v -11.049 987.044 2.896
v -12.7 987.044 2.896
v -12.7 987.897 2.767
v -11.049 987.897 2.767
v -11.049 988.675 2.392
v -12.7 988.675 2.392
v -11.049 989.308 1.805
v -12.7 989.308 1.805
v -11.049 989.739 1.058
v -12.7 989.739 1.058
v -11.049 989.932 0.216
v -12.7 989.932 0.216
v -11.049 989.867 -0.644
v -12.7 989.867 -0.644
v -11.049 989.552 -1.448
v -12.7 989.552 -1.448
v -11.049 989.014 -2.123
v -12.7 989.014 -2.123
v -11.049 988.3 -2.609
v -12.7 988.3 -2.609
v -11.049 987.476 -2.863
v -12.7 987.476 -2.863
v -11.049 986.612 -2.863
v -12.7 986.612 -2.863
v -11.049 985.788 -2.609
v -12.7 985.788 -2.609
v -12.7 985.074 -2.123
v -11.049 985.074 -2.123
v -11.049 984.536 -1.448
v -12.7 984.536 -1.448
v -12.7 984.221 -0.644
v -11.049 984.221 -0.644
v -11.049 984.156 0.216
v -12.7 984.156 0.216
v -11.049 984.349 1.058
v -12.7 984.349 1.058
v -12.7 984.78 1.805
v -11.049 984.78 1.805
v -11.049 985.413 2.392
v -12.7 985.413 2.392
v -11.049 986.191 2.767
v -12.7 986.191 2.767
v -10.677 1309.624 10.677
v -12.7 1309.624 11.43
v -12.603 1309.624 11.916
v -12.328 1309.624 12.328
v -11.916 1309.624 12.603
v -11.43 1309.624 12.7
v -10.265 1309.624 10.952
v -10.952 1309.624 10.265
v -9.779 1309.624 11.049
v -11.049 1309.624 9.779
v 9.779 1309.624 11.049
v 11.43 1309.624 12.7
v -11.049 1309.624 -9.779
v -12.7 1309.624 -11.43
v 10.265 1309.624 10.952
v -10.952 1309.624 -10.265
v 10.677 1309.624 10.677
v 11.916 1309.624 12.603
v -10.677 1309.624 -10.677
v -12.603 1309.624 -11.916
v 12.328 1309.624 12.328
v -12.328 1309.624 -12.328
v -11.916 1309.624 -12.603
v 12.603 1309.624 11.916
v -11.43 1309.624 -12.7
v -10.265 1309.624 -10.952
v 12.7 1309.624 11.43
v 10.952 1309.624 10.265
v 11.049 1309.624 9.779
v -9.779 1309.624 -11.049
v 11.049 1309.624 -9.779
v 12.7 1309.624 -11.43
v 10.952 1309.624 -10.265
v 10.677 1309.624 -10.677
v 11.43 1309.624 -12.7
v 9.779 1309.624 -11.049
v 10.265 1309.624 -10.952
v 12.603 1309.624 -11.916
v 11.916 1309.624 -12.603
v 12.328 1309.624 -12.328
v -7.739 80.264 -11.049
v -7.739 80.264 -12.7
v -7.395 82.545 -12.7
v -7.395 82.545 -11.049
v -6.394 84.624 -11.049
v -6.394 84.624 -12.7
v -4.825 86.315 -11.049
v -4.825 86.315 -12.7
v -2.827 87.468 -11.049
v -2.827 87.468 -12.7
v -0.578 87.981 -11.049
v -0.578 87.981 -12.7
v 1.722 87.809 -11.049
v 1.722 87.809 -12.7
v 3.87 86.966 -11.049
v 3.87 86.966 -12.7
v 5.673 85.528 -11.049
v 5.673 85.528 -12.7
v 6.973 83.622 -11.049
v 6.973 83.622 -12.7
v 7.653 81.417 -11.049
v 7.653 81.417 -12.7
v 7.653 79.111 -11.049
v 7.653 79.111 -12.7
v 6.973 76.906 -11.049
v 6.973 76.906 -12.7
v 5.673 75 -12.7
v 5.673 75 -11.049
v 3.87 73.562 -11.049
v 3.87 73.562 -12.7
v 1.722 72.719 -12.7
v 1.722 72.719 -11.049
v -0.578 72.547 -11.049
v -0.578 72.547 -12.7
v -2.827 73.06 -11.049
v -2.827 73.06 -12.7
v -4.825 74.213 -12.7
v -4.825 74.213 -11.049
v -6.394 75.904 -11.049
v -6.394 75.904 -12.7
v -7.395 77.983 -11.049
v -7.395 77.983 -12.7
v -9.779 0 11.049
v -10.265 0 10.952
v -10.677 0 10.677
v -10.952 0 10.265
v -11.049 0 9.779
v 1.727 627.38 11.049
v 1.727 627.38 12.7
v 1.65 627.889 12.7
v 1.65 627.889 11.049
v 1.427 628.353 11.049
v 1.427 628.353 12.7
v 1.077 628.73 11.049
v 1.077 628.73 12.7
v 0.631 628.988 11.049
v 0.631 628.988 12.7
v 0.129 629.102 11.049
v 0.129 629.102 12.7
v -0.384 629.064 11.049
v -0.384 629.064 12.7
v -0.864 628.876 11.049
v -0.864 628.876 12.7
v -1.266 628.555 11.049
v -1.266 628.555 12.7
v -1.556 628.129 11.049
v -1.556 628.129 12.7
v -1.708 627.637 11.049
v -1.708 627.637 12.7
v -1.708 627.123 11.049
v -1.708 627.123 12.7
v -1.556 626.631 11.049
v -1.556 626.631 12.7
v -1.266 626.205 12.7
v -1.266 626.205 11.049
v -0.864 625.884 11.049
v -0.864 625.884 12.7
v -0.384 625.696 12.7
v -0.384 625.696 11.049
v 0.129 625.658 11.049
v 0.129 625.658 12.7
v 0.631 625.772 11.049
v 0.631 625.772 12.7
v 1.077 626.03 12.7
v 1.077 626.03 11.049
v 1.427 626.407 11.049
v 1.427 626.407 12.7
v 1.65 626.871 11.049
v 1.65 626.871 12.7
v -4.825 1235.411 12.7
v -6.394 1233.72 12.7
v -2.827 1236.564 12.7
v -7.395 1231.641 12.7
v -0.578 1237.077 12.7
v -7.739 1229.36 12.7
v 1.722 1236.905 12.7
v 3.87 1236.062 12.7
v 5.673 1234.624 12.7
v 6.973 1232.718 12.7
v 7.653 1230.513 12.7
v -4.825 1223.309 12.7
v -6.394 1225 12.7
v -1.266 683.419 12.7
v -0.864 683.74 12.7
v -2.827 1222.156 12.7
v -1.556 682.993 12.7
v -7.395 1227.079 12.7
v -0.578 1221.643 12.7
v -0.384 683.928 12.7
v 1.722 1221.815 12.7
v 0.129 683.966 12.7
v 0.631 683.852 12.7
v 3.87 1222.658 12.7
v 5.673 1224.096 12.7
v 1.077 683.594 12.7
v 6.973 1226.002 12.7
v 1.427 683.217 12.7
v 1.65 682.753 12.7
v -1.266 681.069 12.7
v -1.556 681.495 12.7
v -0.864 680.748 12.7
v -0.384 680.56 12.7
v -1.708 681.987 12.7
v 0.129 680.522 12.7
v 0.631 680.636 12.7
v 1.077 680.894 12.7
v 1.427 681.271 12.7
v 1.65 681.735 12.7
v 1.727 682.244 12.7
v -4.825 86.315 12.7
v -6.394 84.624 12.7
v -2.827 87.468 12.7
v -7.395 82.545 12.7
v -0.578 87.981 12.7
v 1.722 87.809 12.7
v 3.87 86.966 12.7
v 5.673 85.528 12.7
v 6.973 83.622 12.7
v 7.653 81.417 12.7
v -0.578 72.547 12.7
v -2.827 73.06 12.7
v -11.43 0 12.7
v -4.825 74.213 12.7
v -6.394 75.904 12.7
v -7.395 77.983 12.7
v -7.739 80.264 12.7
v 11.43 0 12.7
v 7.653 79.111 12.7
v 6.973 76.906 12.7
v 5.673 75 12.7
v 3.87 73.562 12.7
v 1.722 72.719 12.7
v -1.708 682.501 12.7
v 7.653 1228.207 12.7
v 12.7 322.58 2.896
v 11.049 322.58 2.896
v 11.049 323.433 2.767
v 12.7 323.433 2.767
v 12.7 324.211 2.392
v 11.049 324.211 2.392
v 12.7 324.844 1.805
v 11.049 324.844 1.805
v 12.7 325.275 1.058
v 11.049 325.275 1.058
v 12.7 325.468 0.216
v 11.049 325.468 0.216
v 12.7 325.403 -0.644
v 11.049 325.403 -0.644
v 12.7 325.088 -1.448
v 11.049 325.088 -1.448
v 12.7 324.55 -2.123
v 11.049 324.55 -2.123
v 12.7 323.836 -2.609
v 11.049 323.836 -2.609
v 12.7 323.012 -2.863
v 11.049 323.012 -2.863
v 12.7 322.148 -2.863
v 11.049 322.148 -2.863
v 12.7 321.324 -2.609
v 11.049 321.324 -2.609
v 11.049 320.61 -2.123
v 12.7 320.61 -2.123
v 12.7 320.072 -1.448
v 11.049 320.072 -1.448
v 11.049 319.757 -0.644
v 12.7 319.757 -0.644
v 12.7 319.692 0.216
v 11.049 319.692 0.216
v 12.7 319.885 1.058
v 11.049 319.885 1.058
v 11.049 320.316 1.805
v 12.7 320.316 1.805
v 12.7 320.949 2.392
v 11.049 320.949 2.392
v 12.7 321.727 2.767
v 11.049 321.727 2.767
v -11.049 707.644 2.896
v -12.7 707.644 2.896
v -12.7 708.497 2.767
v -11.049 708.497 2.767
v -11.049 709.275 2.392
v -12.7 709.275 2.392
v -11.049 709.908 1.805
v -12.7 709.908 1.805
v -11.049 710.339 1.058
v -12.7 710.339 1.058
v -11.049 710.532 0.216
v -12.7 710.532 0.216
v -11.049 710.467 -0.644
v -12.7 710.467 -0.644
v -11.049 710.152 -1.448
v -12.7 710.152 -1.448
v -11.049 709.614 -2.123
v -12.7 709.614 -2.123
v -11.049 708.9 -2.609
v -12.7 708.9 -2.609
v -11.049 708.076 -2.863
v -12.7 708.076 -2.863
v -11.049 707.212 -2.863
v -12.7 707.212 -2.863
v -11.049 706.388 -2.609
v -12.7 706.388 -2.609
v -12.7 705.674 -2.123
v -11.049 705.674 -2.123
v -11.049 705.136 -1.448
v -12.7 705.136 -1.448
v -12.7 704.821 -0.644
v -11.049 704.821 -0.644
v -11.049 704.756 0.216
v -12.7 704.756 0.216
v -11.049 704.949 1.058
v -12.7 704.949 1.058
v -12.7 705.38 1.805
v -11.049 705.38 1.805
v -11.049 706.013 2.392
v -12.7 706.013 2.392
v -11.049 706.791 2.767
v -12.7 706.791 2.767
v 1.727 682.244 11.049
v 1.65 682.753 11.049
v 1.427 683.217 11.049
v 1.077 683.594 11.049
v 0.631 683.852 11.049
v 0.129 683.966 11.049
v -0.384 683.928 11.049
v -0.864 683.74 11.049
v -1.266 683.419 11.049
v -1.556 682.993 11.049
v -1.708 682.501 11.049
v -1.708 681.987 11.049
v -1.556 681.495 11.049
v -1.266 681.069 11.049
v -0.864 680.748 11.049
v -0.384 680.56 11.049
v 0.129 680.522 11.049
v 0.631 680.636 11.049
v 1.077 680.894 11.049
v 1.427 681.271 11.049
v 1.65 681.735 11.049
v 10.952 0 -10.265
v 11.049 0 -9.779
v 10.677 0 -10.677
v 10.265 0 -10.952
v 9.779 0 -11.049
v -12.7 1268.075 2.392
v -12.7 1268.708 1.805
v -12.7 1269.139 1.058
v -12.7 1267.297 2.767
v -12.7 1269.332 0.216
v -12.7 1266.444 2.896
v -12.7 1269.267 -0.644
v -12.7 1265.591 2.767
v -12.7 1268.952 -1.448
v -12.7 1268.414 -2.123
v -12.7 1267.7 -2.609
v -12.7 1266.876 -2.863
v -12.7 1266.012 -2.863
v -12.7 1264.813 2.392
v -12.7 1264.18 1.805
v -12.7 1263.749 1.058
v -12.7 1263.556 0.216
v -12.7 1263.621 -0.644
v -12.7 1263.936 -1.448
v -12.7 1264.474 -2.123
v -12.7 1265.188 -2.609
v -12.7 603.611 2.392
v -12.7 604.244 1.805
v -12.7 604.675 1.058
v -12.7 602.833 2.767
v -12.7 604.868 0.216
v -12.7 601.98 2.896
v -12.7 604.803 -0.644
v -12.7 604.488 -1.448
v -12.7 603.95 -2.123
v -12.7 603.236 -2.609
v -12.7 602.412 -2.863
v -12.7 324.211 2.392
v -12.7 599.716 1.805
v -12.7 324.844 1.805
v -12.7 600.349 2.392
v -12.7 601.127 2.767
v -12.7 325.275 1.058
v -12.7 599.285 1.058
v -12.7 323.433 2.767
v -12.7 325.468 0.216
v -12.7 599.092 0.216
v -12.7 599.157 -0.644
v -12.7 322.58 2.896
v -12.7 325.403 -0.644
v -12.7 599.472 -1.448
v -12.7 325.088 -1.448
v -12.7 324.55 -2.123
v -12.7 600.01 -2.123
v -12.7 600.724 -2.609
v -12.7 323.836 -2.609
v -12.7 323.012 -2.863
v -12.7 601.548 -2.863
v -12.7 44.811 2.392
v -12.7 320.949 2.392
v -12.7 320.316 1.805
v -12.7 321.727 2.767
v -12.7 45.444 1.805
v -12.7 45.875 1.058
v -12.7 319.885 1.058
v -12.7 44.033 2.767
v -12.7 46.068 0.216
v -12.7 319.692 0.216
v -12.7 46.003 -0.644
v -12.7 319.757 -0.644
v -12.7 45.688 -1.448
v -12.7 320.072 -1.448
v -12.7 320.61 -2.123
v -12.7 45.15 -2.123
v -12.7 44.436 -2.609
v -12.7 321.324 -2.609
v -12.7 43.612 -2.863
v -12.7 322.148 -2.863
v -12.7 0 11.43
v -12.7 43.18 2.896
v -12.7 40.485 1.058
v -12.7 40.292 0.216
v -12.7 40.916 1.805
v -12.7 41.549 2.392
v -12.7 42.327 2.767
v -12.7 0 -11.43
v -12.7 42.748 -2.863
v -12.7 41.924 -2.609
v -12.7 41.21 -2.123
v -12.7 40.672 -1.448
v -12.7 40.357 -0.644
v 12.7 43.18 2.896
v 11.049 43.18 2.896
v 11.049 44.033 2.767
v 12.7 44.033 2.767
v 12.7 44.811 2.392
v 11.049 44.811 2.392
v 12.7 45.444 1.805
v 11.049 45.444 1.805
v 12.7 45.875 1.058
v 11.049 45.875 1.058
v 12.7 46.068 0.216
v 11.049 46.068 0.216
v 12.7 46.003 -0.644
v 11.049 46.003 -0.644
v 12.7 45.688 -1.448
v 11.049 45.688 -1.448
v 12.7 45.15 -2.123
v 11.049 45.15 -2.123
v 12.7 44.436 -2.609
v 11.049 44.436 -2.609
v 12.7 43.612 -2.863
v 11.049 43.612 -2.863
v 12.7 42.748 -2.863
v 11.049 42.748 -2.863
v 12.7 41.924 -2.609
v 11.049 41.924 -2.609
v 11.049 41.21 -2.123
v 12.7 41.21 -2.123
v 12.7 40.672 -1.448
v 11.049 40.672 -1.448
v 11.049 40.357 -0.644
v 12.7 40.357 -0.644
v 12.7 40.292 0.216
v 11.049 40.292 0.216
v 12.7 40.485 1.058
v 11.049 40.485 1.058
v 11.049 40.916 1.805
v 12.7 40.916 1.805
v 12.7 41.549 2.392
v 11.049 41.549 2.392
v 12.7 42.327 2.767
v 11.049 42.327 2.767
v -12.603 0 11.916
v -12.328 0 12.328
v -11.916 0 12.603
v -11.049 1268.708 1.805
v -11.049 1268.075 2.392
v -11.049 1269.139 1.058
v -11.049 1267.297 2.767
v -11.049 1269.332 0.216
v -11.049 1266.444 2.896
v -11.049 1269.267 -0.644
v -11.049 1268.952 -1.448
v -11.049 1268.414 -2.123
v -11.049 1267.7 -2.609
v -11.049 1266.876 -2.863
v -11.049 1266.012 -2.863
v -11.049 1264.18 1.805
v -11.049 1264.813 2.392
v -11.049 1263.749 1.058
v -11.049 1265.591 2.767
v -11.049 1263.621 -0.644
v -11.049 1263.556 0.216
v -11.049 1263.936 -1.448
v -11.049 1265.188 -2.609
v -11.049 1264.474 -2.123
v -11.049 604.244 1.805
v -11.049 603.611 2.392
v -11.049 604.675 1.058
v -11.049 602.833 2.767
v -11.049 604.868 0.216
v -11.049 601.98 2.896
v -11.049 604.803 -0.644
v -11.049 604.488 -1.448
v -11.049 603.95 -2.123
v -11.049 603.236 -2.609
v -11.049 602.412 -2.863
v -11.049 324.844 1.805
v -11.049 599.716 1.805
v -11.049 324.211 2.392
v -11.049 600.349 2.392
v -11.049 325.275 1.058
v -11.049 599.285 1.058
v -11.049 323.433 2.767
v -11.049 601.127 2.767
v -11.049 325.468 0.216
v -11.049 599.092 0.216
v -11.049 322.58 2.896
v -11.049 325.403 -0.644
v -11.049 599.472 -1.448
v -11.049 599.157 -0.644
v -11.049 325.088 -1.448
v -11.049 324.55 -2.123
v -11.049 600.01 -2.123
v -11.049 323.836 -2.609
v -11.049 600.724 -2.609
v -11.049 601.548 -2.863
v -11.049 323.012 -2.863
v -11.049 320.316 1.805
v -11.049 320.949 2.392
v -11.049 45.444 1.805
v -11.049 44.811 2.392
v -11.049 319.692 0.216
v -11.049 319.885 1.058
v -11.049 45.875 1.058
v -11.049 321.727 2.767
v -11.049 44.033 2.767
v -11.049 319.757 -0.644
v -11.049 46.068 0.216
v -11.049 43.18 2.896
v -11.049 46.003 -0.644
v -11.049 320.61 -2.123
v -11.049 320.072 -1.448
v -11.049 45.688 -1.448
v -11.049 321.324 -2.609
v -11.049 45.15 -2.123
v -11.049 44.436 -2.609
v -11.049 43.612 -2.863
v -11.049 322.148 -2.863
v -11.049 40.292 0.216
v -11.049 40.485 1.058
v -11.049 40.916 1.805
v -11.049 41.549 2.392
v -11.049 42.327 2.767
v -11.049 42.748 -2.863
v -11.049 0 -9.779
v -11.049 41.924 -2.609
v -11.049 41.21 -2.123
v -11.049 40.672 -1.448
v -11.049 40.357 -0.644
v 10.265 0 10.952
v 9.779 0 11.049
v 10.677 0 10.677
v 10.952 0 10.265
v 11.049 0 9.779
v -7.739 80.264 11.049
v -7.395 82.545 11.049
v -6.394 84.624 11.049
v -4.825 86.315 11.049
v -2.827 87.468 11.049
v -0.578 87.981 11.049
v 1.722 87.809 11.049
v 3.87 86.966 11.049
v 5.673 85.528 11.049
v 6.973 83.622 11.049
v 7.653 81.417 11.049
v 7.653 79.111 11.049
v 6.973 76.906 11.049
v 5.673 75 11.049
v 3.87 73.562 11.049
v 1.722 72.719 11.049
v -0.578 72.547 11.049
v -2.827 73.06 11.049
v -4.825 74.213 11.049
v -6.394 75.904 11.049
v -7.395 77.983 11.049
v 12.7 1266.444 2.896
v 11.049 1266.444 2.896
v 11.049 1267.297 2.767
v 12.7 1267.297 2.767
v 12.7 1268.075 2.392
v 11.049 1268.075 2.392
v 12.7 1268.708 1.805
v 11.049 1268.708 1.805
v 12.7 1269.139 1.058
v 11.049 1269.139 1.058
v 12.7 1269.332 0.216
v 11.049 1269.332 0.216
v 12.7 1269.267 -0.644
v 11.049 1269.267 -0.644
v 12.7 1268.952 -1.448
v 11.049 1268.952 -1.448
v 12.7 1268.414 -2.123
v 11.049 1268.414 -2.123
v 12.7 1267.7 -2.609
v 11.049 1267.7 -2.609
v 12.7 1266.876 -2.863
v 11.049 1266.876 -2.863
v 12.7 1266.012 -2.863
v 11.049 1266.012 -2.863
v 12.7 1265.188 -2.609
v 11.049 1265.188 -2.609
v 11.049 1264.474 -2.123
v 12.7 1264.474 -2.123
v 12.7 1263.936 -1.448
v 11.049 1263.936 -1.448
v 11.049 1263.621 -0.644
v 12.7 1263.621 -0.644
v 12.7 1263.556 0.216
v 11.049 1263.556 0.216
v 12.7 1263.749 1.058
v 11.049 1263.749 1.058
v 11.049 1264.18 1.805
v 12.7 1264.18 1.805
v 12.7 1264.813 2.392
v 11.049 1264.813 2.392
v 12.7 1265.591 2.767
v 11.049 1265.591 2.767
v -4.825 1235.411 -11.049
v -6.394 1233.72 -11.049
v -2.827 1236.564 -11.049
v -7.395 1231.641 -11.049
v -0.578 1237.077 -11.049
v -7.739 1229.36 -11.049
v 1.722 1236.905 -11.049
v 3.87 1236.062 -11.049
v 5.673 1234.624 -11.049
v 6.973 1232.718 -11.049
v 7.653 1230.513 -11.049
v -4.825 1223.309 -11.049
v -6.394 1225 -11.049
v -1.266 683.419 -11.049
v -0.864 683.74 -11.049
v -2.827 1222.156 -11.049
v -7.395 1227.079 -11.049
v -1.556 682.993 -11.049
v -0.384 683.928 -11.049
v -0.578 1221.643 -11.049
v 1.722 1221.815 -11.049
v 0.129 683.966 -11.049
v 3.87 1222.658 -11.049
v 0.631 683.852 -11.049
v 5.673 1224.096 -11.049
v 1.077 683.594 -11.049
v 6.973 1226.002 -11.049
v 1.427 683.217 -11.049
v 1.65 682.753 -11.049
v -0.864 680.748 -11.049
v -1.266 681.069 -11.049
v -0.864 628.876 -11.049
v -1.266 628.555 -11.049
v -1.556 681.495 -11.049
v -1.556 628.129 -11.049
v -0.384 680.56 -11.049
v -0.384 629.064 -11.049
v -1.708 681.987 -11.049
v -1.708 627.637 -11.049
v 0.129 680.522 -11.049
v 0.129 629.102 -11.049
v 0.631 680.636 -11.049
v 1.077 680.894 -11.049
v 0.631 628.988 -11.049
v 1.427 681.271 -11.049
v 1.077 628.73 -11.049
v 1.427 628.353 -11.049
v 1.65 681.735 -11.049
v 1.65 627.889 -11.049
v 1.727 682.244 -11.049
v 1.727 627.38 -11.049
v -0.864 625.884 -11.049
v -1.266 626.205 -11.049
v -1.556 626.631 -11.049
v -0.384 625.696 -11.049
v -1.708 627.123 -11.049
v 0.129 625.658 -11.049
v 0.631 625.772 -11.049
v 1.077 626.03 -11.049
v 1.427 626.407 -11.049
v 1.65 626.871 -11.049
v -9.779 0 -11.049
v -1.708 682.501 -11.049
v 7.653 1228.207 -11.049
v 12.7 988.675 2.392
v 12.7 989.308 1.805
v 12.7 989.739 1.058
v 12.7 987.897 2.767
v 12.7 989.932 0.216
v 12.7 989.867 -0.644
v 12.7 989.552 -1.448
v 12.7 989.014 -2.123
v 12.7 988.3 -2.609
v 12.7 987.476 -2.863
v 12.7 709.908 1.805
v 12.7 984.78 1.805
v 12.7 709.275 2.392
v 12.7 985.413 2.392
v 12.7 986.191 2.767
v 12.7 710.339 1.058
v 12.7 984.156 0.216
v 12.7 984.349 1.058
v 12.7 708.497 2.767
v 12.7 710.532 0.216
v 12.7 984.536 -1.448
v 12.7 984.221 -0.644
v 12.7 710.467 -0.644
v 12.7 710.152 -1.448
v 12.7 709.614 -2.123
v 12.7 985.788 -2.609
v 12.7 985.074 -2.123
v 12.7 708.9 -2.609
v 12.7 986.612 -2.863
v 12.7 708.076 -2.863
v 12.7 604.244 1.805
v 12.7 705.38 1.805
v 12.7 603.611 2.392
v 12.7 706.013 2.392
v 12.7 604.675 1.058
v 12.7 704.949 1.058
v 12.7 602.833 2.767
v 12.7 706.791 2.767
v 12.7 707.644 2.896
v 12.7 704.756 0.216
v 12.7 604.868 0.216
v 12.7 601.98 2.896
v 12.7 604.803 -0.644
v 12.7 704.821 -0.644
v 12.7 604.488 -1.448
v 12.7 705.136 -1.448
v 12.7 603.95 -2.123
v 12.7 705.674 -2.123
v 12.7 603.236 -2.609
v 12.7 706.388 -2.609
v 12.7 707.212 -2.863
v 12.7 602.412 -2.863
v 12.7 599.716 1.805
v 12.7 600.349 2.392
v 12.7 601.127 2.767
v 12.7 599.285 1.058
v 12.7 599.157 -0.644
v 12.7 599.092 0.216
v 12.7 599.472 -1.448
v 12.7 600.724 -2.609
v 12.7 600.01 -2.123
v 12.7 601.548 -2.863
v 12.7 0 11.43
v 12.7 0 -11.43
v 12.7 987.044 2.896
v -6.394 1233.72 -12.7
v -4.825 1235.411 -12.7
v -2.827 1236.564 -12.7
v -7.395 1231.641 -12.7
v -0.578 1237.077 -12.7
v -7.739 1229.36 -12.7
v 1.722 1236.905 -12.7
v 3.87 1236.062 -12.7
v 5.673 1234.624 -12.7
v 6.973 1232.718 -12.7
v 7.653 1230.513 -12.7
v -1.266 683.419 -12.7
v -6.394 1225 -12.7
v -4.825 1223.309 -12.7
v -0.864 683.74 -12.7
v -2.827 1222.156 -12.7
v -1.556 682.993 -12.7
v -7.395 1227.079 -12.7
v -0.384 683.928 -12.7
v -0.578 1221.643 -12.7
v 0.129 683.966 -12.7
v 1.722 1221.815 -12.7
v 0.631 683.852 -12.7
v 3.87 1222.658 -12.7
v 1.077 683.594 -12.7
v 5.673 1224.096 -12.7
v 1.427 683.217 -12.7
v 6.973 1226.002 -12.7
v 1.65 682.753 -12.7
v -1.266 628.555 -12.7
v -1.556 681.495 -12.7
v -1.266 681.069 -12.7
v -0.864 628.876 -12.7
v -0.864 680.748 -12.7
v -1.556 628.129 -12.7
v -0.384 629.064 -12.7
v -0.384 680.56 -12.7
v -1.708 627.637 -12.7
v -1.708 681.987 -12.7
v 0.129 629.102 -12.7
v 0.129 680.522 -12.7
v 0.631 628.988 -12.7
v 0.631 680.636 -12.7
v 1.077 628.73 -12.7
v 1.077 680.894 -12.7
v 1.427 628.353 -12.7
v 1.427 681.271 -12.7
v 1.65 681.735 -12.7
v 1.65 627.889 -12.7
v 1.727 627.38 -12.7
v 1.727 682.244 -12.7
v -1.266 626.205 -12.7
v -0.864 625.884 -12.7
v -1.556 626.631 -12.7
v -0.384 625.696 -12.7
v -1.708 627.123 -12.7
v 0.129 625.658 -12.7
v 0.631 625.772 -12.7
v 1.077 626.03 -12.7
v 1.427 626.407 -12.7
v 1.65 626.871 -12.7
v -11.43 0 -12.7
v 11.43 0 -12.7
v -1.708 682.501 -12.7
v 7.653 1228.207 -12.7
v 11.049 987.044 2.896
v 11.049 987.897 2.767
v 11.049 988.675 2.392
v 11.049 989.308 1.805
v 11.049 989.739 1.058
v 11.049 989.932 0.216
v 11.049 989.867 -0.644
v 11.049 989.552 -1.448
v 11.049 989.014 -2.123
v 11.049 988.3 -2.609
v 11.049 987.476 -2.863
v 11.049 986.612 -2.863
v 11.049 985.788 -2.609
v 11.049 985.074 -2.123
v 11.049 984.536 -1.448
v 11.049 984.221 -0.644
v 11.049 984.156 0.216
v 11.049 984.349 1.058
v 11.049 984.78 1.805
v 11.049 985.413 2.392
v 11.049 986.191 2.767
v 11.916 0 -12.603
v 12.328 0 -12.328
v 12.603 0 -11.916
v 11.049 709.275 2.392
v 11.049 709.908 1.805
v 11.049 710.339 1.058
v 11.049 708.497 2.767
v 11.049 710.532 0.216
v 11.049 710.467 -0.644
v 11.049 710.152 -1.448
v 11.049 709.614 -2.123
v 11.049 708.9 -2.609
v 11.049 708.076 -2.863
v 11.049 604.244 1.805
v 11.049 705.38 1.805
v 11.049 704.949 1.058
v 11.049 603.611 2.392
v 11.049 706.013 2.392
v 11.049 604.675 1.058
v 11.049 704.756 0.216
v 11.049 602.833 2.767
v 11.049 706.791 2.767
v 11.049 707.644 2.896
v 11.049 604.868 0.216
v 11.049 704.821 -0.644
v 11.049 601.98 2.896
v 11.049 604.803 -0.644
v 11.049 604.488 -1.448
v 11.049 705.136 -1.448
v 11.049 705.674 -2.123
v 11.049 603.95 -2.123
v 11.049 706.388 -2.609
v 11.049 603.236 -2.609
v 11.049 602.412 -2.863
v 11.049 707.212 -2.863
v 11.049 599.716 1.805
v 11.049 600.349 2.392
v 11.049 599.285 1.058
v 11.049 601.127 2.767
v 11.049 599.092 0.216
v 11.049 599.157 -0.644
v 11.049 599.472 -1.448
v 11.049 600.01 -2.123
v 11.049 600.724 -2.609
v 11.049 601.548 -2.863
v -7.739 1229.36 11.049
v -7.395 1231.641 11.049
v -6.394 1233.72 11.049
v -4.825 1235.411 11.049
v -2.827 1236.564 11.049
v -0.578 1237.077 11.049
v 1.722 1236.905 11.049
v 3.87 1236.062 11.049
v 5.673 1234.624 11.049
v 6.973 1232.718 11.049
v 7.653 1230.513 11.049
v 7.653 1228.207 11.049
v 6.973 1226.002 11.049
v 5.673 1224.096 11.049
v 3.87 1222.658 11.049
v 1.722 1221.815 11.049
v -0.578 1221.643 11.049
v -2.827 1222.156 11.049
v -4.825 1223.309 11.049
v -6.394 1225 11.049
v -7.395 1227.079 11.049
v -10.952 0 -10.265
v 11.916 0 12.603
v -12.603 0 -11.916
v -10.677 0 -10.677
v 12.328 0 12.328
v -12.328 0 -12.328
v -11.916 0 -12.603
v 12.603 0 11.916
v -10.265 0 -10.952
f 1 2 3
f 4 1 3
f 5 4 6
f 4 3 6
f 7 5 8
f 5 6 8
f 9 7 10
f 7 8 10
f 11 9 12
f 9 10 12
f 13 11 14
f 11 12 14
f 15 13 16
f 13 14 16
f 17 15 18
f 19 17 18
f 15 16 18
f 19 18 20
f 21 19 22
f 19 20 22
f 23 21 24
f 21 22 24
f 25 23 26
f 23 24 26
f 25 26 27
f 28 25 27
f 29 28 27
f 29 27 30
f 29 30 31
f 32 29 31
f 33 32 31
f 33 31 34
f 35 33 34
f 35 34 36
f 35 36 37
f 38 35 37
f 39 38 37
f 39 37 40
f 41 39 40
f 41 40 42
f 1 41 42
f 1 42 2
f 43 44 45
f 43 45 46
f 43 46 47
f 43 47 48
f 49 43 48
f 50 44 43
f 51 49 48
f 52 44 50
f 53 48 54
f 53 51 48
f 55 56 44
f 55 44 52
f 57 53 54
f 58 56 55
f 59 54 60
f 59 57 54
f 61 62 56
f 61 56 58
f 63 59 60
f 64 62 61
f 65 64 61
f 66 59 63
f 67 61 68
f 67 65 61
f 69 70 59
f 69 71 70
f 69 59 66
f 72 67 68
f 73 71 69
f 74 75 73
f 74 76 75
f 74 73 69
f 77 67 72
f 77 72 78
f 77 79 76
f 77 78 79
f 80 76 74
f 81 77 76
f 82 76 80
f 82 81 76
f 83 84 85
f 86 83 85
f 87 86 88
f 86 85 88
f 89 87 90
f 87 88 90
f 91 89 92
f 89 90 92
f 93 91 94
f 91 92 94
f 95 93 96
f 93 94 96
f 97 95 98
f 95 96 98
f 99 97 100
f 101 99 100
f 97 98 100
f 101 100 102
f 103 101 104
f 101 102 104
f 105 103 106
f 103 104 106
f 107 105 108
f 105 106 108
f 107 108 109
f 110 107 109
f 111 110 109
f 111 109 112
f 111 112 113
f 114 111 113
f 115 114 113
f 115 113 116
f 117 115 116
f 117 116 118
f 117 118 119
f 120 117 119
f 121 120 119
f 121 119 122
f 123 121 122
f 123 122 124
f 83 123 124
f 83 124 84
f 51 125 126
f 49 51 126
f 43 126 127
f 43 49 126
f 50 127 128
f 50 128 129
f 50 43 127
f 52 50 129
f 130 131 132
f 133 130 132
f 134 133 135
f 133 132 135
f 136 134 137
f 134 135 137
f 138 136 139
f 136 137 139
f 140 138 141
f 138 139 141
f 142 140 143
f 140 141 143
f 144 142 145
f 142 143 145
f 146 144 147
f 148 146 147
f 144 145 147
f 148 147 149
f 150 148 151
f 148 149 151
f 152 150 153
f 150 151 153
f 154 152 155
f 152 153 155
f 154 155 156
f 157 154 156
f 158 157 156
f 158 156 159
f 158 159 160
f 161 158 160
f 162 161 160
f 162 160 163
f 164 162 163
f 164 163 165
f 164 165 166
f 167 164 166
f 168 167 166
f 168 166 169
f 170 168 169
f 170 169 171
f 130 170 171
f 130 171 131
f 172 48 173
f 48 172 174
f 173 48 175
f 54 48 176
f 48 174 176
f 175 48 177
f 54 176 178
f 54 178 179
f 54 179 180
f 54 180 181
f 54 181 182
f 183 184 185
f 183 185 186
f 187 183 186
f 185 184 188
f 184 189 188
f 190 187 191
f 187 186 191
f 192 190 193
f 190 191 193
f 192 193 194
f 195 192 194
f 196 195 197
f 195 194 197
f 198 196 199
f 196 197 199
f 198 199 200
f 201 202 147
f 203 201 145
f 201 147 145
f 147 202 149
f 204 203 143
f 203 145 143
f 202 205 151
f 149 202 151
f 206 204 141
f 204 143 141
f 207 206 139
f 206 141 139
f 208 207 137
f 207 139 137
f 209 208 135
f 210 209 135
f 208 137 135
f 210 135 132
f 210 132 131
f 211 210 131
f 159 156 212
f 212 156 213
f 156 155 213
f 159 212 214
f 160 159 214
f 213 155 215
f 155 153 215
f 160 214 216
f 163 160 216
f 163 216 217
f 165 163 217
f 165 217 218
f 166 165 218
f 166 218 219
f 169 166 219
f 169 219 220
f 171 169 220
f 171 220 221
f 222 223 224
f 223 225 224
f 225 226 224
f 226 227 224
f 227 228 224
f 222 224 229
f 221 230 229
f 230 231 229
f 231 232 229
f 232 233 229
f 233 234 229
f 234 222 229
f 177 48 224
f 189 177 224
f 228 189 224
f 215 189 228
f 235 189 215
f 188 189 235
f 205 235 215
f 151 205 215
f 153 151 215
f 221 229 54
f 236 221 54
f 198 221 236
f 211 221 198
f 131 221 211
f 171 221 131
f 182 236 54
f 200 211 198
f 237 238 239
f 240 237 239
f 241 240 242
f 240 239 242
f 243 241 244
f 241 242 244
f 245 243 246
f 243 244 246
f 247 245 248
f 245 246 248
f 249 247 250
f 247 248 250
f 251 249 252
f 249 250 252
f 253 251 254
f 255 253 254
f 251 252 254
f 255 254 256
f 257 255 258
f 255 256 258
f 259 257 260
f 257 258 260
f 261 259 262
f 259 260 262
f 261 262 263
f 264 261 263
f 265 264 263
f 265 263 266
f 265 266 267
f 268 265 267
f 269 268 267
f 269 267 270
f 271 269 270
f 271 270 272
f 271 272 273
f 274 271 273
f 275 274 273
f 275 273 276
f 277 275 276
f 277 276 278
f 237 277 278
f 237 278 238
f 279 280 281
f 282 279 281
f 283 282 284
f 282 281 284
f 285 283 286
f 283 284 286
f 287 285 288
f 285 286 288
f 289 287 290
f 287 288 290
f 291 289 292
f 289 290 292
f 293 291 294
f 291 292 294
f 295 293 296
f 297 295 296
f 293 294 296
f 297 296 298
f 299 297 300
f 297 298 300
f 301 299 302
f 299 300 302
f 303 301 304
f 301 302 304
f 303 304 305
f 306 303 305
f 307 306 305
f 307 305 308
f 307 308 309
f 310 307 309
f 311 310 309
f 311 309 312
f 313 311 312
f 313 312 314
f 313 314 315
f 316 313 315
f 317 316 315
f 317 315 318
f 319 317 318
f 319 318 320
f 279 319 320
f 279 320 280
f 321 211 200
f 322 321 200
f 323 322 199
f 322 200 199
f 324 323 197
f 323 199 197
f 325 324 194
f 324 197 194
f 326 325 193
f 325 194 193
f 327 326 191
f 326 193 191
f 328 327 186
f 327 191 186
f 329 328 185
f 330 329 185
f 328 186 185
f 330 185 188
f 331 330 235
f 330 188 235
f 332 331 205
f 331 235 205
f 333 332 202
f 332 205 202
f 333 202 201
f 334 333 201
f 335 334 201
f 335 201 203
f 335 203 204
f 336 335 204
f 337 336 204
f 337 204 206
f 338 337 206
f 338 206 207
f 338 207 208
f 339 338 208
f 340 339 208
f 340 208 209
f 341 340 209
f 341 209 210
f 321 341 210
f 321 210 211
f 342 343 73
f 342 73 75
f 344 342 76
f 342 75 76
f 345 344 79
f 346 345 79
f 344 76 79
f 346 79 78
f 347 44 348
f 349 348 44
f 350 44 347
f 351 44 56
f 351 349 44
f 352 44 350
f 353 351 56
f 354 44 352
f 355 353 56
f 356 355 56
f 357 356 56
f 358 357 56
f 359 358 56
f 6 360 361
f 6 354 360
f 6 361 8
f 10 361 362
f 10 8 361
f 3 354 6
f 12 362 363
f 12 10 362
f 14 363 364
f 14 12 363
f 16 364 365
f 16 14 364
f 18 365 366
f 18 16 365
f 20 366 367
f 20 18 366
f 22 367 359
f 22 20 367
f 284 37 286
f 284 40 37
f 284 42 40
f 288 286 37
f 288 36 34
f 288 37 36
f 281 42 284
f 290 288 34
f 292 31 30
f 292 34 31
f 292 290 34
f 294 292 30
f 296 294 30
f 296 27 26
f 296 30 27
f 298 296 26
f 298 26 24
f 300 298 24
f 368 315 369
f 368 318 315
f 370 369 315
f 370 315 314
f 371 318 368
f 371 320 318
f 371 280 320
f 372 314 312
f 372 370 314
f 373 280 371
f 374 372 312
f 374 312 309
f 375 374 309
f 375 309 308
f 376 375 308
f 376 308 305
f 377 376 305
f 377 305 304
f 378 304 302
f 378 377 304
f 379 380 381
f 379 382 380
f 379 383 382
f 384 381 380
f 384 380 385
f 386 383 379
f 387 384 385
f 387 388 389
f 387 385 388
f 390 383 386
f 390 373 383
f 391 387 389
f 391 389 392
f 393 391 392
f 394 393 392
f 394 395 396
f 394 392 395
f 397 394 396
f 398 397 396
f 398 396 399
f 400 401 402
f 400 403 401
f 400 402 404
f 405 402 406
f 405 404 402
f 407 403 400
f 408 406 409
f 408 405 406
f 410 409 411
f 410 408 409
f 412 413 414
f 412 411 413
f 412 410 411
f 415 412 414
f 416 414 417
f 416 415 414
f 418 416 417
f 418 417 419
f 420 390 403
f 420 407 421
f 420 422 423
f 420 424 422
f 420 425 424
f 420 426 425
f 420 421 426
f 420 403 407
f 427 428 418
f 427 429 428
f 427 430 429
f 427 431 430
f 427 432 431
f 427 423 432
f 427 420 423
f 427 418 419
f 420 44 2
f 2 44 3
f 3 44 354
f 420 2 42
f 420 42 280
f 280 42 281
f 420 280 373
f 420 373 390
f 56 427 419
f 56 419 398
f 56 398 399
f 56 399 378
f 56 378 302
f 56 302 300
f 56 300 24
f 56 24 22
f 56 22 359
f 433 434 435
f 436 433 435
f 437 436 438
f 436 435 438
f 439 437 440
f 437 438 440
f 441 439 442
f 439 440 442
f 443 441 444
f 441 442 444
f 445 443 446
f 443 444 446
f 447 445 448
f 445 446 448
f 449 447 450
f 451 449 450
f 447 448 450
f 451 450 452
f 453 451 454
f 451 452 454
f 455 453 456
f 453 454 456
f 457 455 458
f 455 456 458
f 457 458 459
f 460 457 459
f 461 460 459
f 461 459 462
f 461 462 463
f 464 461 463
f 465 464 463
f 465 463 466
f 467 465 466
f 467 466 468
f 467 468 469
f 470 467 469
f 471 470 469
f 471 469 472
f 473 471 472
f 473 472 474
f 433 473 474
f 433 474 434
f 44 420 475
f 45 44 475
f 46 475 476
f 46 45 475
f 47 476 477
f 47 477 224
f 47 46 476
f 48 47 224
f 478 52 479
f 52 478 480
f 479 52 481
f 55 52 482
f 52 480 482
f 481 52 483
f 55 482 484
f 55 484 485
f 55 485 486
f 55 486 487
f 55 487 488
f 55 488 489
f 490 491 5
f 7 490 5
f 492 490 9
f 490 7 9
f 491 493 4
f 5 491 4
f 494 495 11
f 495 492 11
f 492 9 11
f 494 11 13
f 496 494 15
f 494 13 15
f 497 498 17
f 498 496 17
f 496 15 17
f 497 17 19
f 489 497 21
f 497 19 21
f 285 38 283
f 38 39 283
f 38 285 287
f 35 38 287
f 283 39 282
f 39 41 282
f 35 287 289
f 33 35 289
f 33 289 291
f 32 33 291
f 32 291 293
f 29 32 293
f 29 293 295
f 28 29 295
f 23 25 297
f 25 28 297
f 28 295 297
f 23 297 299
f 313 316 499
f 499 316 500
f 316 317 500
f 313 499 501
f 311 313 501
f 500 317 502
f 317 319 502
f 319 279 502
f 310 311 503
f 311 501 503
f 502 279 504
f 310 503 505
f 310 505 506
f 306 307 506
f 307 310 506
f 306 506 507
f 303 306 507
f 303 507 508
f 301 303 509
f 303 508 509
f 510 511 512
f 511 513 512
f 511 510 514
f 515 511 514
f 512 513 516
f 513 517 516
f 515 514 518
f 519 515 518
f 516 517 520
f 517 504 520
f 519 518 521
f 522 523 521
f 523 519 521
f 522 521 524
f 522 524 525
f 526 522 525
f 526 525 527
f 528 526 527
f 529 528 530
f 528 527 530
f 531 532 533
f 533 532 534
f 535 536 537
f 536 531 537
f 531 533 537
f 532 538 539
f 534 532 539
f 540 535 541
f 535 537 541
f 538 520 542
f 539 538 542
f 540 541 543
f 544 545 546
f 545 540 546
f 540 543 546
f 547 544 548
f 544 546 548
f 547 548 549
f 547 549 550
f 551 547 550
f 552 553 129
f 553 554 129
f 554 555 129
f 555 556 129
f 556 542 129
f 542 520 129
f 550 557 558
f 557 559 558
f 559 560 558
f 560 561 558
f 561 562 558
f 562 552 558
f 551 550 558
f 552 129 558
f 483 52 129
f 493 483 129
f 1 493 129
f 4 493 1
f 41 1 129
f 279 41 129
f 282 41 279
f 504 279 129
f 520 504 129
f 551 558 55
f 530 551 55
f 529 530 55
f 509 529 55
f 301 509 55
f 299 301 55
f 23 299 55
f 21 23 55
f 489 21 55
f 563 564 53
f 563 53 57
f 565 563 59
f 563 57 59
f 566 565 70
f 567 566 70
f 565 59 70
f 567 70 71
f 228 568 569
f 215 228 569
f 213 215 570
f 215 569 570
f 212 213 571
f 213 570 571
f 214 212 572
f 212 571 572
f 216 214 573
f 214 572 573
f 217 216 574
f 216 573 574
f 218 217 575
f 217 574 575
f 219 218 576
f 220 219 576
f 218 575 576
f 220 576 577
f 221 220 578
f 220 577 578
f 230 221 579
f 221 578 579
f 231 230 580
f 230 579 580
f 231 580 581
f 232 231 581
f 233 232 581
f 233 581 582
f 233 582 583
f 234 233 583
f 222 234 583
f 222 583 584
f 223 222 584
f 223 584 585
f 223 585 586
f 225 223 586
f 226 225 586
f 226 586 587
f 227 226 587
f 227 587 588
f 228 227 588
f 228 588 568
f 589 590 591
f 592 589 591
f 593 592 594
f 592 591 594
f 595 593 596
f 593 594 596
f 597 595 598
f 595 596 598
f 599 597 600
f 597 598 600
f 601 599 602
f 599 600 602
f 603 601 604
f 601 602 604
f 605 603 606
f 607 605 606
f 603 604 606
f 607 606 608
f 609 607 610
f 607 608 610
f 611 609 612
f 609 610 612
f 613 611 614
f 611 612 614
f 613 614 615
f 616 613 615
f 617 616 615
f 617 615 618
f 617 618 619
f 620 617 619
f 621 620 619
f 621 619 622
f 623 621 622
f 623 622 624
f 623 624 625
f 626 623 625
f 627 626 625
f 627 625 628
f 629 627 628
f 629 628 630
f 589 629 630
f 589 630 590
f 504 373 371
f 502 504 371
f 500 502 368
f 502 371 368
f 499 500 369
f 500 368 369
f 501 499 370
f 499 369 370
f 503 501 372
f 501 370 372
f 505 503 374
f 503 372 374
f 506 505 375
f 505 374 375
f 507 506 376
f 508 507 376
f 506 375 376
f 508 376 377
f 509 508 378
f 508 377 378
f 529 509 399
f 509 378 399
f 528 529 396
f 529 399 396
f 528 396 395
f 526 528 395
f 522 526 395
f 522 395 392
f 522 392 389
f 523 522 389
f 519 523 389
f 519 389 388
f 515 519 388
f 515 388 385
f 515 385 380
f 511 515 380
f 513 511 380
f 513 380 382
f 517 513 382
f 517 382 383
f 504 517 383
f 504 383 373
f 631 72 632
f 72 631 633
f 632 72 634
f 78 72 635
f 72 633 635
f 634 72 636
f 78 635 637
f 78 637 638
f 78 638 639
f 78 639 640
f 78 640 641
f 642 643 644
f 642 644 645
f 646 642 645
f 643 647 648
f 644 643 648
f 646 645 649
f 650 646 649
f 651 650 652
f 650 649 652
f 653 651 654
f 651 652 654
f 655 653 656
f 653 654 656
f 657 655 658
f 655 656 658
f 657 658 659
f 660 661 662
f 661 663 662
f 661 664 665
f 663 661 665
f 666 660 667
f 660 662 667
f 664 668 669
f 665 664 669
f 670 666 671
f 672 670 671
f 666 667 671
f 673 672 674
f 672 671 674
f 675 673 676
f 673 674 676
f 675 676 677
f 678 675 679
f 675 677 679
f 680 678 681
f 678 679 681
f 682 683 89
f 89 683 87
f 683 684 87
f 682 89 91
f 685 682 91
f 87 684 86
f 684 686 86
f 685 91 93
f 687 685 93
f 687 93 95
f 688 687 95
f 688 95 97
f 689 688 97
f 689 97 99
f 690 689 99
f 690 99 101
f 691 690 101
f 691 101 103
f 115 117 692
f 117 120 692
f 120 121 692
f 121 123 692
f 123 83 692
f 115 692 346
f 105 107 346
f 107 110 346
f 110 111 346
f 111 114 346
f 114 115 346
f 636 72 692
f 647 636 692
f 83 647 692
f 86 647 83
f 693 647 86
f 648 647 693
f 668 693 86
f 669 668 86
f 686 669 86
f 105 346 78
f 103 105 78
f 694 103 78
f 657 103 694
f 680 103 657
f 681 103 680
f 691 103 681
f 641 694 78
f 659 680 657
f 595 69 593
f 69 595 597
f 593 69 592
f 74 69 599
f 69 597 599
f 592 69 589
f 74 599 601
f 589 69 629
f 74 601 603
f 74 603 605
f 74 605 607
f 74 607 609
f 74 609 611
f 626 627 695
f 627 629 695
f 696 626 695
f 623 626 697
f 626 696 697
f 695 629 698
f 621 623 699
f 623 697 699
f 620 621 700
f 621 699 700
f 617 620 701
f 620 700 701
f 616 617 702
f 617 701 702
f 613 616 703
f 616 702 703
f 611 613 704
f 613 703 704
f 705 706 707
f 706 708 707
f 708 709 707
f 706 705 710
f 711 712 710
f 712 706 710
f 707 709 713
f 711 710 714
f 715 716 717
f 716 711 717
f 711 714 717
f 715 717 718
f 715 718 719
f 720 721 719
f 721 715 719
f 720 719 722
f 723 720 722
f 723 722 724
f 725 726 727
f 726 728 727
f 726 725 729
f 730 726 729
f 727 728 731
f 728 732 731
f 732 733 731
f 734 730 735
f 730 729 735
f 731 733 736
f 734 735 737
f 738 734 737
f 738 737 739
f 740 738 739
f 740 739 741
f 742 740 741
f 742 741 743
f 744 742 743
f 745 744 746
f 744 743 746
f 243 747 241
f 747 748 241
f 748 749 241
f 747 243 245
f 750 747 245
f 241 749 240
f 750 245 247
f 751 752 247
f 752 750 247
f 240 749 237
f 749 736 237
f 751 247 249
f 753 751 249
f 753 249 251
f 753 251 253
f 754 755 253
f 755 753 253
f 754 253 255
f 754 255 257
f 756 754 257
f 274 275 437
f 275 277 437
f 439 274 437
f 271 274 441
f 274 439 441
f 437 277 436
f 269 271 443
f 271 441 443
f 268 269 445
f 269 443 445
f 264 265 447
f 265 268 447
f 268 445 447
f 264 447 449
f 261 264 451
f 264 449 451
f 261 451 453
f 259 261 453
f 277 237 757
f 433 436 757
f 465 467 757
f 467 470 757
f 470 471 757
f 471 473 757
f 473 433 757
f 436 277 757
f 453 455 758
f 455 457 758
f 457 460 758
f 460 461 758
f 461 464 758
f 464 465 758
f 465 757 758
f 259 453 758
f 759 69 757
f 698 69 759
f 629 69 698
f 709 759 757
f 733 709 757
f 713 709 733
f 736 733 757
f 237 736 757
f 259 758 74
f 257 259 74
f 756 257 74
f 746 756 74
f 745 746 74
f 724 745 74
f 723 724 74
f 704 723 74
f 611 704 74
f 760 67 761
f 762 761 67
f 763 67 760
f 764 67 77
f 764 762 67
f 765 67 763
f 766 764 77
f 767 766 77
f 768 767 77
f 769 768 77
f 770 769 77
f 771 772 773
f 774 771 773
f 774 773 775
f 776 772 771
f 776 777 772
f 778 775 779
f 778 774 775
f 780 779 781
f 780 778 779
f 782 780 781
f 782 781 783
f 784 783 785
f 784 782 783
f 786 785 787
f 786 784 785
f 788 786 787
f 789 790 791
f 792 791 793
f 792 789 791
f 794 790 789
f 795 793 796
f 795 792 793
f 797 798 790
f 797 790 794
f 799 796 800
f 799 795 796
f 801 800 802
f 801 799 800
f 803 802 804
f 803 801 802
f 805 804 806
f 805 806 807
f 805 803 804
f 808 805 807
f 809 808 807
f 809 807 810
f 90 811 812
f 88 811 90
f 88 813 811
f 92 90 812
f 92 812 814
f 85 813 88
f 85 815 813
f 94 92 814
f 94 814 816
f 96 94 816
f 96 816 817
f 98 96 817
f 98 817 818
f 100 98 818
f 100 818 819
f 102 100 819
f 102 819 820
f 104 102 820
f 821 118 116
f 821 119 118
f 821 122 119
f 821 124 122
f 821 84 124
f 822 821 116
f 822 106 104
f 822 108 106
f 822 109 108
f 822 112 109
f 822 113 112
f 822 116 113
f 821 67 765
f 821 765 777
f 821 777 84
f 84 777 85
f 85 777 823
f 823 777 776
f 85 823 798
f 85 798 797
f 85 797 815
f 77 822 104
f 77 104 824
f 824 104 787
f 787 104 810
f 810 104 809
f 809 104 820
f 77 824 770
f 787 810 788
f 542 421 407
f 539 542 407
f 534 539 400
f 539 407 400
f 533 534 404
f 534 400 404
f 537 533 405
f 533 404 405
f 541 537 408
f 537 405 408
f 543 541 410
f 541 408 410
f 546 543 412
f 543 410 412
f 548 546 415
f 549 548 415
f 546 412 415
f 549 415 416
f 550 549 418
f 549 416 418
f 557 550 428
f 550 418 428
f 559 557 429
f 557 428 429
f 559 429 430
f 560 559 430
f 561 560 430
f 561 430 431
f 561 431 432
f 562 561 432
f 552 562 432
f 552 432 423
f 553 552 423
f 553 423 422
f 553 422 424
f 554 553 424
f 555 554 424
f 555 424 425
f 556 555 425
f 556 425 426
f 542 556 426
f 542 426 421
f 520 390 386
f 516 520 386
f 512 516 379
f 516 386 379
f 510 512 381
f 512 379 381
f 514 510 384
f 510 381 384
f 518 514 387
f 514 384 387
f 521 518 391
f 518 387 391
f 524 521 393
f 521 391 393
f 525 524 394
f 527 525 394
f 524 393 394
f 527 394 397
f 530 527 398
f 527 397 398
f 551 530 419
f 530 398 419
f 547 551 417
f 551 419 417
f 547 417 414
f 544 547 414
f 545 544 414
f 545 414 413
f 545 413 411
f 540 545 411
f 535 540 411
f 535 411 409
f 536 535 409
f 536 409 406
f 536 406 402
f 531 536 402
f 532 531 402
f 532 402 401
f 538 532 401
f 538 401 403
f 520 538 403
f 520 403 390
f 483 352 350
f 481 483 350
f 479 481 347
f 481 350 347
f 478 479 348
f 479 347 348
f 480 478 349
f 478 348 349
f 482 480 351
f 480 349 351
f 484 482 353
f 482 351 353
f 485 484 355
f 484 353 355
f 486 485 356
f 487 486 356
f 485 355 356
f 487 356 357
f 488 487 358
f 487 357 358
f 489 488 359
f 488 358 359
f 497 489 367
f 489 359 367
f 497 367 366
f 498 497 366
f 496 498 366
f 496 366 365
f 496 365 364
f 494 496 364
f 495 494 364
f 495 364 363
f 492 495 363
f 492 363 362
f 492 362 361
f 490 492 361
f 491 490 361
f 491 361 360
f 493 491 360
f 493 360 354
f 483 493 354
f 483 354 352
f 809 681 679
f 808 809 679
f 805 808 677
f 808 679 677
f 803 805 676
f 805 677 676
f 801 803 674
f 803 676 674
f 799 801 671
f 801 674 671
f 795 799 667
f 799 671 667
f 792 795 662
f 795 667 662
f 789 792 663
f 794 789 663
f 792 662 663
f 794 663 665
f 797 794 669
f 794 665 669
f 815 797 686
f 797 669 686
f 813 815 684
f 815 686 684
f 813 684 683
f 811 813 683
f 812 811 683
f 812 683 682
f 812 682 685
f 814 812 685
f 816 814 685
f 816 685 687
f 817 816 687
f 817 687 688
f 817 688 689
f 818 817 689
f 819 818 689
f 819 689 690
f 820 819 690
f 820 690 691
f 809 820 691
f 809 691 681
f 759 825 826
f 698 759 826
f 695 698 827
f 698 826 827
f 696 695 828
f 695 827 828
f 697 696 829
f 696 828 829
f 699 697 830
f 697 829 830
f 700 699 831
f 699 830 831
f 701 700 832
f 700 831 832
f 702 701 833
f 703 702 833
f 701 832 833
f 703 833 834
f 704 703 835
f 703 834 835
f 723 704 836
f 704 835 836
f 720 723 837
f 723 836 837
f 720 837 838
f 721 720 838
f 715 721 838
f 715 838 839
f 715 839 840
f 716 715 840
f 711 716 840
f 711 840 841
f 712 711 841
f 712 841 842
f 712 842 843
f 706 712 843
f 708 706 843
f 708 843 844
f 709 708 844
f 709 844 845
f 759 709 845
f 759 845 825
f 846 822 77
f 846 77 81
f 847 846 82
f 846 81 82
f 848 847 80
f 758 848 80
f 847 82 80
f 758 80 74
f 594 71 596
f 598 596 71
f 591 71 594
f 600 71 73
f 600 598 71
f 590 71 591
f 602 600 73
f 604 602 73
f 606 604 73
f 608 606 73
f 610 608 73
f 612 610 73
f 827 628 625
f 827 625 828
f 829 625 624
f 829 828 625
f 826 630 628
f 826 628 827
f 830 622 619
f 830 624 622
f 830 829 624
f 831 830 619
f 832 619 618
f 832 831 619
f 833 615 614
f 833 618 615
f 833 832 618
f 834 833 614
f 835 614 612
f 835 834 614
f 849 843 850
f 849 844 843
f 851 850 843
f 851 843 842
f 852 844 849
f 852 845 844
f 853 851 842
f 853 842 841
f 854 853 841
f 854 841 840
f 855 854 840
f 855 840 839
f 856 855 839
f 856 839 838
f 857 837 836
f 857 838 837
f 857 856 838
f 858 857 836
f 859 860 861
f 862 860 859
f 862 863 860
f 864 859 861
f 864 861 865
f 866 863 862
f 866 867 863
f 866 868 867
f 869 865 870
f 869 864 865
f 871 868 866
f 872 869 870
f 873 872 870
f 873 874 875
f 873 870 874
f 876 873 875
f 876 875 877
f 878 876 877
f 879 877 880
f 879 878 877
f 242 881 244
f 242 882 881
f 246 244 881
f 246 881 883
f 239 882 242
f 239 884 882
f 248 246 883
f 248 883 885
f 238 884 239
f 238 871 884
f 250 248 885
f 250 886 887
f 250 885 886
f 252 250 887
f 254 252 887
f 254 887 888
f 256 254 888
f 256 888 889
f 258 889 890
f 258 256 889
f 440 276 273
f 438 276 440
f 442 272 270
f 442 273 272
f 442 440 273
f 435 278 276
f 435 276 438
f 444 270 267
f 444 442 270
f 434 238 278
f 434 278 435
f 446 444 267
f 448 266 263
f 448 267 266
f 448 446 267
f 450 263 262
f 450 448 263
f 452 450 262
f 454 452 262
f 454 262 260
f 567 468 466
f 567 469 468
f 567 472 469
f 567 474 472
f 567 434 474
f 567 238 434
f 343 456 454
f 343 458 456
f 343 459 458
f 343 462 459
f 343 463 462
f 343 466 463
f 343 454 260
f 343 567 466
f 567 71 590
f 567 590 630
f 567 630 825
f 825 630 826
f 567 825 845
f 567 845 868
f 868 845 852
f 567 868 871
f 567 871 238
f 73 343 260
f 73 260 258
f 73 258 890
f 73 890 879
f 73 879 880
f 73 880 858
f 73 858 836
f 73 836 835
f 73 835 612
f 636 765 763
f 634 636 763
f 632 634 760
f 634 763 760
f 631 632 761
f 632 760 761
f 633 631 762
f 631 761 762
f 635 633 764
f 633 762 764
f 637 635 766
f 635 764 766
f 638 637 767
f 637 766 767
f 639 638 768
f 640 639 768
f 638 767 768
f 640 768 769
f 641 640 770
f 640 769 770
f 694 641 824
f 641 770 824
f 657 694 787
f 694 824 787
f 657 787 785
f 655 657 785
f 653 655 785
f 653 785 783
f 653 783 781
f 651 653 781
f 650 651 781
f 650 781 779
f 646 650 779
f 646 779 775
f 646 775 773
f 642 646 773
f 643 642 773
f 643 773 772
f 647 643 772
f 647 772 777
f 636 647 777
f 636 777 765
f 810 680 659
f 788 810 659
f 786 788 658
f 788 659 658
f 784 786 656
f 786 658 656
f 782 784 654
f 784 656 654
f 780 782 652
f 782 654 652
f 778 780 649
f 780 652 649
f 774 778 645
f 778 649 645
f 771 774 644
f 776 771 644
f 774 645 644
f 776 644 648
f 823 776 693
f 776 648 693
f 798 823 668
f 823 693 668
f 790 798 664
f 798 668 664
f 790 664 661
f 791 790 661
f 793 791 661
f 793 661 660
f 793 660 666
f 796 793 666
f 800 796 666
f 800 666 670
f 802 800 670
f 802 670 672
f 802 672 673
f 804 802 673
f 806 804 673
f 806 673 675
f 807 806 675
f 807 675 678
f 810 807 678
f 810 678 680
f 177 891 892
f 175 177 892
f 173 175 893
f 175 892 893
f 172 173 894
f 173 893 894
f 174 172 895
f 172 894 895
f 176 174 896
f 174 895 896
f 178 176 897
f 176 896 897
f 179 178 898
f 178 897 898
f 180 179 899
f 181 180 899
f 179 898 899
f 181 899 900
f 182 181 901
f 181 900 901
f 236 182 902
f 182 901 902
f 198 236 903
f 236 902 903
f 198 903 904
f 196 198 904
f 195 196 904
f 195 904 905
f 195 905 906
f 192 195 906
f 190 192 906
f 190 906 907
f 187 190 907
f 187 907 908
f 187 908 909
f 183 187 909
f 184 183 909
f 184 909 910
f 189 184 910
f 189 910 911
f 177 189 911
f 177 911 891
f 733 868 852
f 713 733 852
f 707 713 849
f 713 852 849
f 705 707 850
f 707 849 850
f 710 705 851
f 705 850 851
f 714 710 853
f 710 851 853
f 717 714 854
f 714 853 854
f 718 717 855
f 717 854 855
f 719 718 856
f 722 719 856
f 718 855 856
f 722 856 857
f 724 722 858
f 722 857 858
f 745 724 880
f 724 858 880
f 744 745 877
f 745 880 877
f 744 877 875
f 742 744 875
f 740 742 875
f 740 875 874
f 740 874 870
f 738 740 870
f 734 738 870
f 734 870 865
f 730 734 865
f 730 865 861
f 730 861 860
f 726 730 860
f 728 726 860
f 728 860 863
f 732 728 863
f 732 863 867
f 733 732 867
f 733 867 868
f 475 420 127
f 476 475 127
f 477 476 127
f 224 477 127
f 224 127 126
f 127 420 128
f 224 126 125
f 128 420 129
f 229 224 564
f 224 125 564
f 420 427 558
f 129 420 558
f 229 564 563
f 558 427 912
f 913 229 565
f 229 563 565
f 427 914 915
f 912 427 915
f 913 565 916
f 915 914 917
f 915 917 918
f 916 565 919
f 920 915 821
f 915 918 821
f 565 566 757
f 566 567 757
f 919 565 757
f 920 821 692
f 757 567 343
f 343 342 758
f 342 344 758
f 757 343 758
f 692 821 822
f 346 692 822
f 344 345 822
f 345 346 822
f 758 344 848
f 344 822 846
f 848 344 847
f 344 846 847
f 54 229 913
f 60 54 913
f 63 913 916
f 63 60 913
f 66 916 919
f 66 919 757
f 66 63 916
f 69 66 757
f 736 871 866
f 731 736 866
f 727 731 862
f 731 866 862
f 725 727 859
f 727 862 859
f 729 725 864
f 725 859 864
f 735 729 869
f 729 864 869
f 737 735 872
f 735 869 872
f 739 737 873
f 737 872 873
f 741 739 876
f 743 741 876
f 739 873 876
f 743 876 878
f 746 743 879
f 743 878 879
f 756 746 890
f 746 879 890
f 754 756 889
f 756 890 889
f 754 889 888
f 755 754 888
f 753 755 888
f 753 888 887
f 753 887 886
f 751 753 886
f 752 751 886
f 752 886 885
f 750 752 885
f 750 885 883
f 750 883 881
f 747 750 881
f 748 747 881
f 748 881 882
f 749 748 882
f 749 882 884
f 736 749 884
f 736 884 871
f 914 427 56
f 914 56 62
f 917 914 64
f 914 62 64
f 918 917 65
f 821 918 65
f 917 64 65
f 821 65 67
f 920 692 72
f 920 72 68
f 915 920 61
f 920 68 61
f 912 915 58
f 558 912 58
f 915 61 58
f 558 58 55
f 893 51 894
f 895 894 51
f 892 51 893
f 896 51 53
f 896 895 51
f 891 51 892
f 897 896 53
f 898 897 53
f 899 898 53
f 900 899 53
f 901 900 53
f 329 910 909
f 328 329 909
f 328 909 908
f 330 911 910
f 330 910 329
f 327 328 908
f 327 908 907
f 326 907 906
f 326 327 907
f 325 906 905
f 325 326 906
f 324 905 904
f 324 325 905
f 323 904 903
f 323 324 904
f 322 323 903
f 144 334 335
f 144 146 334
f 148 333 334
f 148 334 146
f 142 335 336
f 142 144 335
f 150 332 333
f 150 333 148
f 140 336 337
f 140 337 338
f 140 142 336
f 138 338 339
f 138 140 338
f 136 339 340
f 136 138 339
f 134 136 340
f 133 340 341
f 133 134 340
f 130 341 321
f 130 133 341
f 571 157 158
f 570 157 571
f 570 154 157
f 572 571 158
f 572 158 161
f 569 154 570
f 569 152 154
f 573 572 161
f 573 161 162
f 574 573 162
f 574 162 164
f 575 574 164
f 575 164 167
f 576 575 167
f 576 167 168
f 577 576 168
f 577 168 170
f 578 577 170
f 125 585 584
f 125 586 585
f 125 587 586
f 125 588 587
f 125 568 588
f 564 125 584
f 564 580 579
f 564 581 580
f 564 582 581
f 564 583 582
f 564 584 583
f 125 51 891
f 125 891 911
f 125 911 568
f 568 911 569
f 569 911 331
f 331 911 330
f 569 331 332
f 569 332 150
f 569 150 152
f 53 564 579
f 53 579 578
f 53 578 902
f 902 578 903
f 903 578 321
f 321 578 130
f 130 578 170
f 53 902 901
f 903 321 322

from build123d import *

# Parameters (mm, degrees)
SKETCH1_W                        = 25.4
SKETCH1_H                        = 25.4
SKETCH1_W_2                      = 22.098
SKETCH1_H_2                      = 22.098
BOSS_EXTRUDE1_DEPTH              = 1309.624
FILLET1_R                        = 1.27
F_1_0_228_DIAMETER_HOLE1_D       = 5.7912
F_8_32_TAPPED_HOLE1_D            = 3.4544
F_39_64_0_60938_DIAMETER_HOLE1_D = 15.478252


with BuildPart() as part:
    # Sketch1 → Boss-Extrude1 (new body)
    with BuildSketch(Plane(origin=(0, 0, 0), x_dir=(1, 0, 0), z_dir=(0, 1, 0))):
        Rectangle(SKETCH1_W, SKETCH1_H)
        Rectangle(SKETCH1_W_2, SKETCH1_H_2, mode=Mode.SUBTRACT)
    extrude(amount=BOSS_EXTRUDE1_DEPTH)

    # Fillet1
    fillet1_edges = [part.edges().sort_by_distance(p)[0] for p in [
        (-11.049, 654.812, 11.049),
        (11.049, 654.812, 11.049),
        (11.049, 654.812, -11.049),
        (-11.049, 654.812, -11.049),
        (12.7, 654.812, 12.7),
        (-12.7, 654.812, 12.7),
        (-12.7, 654.812, -12.7),
        (12.7, 654.812, -12.7),
    ]]
    fillet(fillet1_edges, radius=FILLET1_R)

    # #1 (0.228) Diameter Hole1 (through all)
    with Locations(Plane(origin=(12.7, 0, 0), x_dir=(0, 0, -1), z_dir=(1, 0, 0))):
        with Locations((0, 601.98), (0, 1266.444), (0, 987.044), (0, 707.644), (0, 43.18), (0, 322.58)):
            Hole(F_1_0_228_DIAMETER_HOLE1_D / 2)

    # #8-32 Tapped Hole1 (through all)
    with Locations(Plane(origin=(0, 0, -12.7), x_dir=(-1, 0, 0), z_dir=(0, 0, -1))):
        with Locations((0, 627.38), (0, 682.244)):
            Hole(F_8_32_TAPPED_HOLE1_D / 2)

    # 39/64 (0.60938) Diameter Hole1 (through all)
    with Locations(Plane.XY.offset(12.7)):
        with Locations((0, 1229.36), (0, 80.264)):
            Hole(F_39_64_0_60938_DIAMETER_HOLE1_D / 2)


solid = part.part
